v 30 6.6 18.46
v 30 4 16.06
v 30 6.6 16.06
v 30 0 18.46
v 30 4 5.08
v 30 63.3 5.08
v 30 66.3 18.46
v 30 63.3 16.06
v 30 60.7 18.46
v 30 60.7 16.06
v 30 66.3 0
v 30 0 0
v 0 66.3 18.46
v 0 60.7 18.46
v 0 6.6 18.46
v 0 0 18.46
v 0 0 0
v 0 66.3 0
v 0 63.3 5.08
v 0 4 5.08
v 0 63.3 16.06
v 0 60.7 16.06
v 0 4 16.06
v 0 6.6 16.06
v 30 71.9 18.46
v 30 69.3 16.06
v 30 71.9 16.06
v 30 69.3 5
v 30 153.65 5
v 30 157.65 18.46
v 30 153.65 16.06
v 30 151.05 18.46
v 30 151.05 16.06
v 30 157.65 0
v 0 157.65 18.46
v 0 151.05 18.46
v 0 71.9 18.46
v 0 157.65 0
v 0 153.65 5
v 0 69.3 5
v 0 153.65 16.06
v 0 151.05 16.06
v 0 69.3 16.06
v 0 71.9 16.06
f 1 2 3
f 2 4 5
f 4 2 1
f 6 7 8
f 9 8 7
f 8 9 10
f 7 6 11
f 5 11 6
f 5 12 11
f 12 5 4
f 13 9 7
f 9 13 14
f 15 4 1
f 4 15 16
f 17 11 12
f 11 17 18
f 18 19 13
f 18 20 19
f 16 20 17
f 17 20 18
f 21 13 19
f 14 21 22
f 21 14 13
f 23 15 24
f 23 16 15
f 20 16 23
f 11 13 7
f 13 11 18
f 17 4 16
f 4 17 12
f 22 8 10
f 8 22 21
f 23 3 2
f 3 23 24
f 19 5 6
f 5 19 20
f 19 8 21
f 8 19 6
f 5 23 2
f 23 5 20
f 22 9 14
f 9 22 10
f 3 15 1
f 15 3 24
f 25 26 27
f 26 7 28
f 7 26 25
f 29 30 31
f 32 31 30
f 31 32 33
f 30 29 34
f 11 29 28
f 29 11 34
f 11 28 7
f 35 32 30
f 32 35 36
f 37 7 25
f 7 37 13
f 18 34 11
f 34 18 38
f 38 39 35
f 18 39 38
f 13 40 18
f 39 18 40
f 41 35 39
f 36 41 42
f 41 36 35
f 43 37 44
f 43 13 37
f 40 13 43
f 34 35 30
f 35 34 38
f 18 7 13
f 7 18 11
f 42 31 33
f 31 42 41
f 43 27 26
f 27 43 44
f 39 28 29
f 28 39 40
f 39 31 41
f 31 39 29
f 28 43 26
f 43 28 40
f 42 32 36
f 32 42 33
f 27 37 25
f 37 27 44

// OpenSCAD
MobileWidht = 84.35;
MobileHight = 11.06;

keybWidth = 59.30;
keybHight = 10.98;

edgeHolderWidth = 4;
midSeparatorWidth = 6;

holderWidth = 30;
minBaseHight = 5;
topOfHolderHight = 2.4;
topOfHolderLenght = 2.6;

//TotalHight is MobileHihgt (cause it is bigger then keyboardHight + minimal base plate hight + HightofholderTop 
totalHight = minBaseHight + MobileHight + topOfHolderHight;

//Keyboard Holder
difference(){
cube([holderWidth,edgeHolderWidth + keybWidth + midSeparatorWidth/2,totalHight]);
translate([-5,edgeHolderWidth,totalHight-(topOfHolderHight+keybHight)])
    cube([holderWidth +10,keybWidth,keybHight]);
translate([-5,edgeHolderWidth+topOfHolderLenght,totalHight-(topOfHolderHight+keybHight)]) cube([holderWidth +10,keybWidth-(2*topOfHolderLenght),keybHight+topOfHolderHight+1]);
}

//Phone Holder
translate([0,edgeHolderWidth + keybWidth + midSeparatorWidth/2,0])
difference() {
cube([holderWidth,midSeparatorWidth/2 + MobileWidht + edgeHolderWidth,totalHight]);
translate([-5,midSeparatorWidth/2,totalHight-(MobileHight+topOfHolderHight)]) cube([holderWidth+10,MobileWidht,MobileHight]);
translate([-5,midSeparatorWidth/2+topOfHolderLenght,totalHight-5]) cube([holderWidth+10,MobileWidht-(2*topOfHolderLenght),10]);
}
